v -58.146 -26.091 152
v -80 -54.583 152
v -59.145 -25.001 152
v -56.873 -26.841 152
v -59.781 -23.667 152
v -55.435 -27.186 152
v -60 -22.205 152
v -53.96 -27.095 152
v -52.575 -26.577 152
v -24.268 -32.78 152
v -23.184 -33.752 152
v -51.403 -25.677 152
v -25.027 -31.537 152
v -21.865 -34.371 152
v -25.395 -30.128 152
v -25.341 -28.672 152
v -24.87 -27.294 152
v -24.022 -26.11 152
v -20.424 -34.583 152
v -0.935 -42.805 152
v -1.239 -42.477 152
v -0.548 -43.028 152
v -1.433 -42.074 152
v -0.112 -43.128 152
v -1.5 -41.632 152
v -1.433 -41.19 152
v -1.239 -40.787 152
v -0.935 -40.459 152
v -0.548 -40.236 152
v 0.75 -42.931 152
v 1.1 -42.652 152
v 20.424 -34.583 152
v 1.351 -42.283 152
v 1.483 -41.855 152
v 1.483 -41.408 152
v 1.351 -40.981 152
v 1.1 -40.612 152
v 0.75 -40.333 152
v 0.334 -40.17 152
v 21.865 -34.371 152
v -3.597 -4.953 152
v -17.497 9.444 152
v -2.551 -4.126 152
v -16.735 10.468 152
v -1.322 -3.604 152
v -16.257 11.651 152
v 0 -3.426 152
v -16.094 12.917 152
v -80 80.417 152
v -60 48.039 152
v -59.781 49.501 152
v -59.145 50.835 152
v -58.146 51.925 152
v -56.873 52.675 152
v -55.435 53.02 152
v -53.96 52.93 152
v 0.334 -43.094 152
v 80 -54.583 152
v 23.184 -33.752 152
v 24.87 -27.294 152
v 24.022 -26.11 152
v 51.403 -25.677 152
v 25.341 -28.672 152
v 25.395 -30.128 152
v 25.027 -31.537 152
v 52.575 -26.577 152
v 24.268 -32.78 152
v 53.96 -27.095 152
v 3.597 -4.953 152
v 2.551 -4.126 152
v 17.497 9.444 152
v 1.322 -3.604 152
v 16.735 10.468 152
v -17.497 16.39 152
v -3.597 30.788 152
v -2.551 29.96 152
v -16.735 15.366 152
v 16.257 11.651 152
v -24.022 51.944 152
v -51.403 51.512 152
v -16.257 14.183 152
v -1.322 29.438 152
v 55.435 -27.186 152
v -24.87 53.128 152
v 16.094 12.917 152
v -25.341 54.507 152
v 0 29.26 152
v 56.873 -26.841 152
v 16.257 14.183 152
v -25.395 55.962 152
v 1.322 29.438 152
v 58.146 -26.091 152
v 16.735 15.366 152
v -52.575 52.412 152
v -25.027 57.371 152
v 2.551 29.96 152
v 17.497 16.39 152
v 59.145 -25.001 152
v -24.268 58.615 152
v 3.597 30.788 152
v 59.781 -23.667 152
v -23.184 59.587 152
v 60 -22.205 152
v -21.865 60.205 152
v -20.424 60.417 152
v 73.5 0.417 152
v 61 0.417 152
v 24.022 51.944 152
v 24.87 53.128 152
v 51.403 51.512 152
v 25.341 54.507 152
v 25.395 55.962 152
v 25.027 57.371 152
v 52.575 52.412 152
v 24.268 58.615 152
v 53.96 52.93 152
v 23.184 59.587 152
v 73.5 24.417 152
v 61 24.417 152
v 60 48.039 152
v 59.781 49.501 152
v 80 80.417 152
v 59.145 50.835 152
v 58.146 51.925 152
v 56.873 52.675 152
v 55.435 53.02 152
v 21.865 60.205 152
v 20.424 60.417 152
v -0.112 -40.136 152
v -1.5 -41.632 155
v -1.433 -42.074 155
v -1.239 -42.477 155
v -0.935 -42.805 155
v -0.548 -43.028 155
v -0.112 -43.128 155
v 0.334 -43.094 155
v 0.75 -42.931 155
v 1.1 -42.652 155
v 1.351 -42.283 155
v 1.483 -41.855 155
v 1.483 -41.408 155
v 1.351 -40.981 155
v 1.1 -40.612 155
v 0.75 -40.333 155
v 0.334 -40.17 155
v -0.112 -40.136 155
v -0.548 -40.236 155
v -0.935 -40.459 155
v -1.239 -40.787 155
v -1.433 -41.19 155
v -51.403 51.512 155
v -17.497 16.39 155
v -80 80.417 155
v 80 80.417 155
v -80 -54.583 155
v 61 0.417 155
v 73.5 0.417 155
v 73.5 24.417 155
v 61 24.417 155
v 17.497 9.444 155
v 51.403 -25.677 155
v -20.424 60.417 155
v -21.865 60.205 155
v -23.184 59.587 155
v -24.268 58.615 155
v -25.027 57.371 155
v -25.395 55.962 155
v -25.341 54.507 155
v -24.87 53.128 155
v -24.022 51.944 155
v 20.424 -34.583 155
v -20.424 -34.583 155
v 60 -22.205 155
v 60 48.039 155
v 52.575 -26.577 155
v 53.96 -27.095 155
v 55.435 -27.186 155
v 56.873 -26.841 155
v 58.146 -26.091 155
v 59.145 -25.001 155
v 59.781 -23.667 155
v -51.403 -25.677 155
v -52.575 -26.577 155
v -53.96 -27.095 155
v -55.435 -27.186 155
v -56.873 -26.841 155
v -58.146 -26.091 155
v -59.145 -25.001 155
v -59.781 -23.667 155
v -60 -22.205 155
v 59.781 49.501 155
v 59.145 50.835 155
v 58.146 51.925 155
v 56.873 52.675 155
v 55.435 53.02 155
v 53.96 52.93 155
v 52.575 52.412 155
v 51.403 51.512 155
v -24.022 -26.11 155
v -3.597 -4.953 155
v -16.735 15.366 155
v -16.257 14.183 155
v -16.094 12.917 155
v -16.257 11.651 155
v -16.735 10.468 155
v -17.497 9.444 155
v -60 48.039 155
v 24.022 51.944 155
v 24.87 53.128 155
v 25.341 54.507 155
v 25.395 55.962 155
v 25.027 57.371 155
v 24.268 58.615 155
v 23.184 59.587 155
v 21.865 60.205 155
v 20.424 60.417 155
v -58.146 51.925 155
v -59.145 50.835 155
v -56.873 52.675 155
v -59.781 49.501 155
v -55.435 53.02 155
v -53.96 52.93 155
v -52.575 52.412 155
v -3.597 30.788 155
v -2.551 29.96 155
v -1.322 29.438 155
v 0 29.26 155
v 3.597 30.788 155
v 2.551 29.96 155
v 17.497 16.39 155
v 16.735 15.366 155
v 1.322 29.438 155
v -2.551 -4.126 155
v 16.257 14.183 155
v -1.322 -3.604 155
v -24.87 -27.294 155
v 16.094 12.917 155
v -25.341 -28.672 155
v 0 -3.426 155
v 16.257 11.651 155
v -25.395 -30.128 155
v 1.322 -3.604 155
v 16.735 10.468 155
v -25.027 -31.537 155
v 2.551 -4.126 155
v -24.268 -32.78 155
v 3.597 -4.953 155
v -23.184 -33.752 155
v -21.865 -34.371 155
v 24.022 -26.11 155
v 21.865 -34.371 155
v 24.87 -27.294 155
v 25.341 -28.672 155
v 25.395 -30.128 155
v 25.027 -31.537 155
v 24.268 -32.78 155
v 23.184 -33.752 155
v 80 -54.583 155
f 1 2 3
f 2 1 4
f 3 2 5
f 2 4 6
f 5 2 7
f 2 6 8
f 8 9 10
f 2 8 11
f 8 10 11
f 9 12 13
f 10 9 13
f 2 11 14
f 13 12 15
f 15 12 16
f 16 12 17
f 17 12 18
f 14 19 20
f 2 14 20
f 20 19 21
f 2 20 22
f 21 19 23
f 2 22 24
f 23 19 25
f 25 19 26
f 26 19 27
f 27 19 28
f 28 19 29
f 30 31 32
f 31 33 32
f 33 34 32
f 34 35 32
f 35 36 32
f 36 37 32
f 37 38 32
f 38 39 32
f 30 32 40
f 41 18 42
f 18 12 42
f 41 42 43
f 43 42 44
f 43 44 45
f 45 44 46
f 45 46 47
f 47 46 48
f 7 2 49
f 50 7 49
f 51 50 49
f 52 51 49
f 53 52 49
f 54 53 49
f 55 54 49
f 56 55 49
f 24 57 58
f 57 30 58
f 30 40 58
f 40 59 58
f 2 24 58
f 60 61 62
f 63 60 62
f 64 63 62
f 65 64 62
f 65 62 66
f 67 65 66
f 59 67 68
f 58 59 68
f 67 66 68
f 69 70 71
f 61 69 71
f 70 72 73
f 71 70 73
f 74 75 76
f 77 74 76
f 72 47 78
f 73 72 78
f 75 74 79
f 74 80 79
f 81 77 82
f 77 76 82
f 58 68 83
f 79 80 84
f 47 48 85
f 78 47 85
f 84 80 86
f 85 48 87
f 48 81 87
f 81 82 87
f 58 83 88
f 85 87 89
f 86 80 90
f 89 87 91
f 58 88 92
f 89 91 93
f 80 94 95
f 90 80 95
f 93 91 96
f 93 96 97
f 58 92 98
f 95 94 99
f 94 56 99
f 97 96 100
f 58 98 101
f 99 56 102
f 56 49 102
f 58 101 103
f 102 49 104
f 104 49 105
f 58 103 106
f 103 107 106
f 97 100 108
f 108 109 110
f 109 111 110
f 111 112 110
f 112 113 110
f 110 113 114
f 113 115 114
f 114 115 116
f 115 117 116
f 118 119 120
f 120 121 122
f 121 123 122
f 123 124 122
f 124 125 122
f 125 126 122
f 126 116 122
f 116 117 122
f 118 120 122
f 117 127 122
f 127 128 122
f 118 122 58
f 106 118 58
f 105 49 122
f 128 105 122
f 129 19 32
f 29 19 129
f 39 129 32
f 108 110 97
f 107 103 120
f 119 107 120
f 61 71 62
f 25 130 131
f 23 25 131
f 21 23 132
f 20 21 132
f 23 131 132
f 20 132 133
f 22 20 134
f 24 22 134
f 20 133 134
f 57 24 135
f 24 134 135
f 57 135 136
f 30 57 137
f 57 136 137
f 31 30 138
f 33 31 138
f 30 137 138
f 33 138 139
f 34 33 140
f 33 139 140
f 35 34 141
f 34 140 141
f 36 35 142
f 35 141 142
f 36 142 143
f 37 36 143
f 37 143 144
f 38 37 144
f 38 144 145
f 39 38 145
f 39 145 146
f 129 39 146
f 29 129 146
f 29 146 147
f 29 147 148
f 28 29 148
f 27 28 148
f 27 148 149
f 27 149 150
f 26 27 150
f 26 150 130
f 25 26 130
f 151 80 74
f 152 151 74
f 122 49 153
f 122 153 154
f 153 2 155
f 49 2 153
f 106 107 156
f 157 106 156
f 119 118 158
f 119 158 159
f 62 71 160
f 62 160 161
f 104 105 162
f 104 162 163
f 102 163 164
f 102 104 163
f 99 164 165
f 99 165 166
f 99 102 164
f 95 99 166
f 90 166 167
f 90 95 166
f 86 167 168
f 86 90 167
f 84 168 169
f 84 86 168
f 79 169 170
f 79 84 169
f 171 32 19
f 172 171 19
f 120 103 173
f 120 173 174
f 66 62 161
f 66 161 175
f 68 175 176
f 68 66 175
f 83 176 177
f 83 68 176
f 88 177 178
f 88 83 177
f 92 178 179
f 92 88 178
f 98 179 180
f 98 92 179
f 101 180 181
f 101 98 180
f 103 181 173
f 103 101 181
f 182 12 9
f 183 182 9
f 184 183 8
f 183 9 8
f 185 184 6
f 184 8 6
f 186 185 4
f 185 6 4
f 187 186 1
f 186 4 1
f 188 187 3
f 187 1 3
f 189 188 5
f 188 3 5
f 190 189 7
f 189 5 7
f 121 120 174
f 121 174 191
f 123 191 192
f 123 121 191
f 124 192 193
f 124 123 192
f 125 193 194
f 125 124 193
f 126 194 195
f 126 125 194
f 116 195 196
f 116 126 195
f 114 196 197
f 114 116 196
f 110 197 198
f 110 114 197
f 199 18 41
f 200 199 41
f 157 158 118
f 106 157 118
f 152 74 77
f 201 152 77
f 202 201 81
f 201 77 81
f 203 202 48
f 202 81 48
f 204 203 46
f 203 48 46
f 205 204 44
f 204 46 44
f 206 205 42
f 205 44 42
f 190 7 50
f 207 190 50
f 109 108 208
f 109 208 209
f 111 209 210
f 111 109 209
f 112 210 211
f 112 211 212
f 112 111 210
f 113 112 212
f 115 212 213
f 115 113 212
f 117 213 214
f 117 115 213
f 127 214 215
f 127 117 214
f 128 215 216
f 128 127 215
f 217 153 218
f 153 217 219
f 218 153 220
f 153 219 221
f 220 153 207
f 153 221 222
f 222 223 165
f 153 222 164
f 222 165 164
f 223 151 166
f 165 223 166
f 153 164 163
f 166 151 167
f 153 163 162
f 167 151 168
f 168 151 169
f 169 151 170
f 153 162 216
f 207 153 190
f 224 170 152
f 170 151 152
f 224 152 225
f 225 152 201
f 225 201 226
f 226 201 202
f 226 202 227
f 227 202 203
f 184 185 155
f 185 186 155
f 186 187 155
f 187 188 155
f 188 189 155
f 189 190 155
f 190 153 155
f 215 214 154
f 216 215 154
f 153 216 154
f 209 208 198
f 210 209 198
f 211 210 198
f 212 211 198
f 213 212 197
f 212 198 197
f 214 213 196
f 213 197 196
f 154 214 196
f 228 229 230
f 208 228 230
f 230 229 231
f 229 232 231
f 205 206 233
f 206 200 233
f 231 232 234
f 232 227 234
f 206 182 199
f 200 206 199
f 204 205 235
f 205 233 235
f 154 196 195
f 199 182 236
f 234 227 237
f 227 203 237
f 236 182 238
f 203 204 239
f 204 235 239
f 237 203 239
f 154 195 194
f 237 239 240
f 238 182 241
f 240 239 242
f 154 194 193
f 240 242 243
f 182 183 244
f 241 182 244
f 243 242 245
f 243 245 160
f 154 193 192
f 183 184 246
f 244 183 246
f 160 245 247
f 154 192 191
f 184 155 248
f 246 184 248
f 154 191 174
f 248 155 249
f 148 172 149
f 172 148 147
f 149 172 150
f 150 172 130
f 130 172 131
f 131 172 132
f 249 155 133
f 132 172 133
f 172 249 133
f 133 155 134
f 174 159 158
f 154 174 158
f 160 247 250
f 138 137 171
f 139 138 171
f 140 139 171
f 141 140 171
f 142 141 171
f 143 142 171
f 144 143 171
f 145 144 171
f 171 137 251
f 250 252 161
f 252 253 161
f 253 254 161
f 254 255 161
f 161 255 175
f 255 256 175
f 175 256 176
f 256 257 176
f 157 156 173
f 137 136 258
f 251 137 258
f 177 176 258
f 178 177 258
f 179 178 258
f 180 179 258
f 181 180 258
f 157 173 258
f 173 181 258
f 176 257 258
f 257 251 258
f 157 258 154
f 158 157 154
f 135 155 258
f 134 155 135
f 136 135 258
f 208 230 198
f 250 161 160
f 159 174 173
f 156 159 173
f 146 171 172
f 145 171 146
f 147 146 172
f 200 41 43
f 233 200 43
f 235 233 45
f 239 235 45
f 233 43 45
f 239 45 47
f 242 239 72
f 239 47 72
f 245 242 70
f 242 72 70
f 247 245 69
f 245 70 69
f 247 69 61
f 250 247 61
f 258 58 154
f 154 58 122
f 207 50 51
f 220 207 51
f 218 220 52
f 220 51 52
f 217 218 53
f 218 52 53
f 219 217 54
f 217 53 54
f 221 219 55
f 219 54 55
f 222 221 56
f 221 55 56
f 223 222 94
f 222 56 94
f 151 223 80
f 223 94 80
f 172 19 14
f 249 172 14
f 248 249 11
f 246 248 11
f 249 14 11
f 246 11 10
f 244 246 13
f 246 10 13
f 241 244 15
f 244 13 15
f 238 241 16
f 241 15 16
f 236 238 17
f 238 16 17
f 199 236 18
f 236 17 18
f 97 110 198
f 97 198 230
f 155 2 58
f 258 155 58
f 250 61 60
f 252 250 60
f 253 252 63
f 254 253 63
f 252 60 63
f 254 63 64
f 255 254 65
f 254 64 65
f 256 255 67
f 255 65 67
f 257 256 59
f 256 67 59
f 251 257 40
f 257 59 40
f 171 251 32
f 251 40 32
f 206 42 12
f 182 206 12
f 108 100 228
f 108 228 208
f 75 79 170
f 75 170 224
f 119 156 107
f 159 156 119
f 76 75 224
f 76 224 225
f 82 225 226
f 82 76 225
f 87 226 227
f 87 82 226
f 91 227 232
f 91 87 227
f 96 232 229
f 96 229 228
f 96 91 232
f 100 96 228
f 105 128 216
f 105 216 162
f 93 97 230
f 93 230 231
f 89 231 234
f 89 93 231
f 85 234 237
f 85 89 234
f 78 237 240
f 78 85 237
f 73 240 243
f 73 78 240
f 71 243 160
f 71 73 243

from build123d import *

# Parameters (mm, degrees)
SKETCH1_W           = 160
SKETCH1_H           = 135
BOSS_EXTRUDE1_DEPTH = 3
CUT_EXTRUDE1_DEPTH  = 20
SKETCH3_W           = 10
SKETCH3_H           = 20.2
CUT_EXTRUDE2_DEPTH  = 10
SKETCH5_W           = 10
SKETCH5_H           = 3
BOSS_EXTRUDE2_DEPTH = 30
SKETCH6_W           = 10
SKETCH6_H           = 20.15
CUT_EXTRUDE3_DEPTH  = 30
SKETCH7_W           = 10
SKETCH7_H           = 3
BOSS_EXTRUDE3_DEPTH = 30
SKETCH8_W           = 11.5
SKETCH8_H           = 21.5
CUT_EXTRUDE4_DEPTH  = 10
SKETCH9_W           = 11.5
SKETCH9_H           = 3
BOSS_EXTRUDE5_DEPTH = 30
SKETCH10_W          = 11
SKETCH10_H          = 21
CUT_EXTRUDE5_DEPTH  = 30
SKETCH11_W          = 3
SKETCH11_H          = 21
CUT_EXTRUDE6_DEPTH  = 1.5
SKETCH12_W          = 12.5
SKETCH12_H          = 3
CUT_EXTRUDE7_DEPTH  = 3


with BuildPart() as part:
    # Sketch1 → Boss-Extrude1 (new body)
    with BuildSketch(Plane.XY.offset(152)):
        with Locations((0, 12.91714511)):
            Rectangle(SKETCH1_W, SKETCH1_H)
        with BuildLine():
            Line((-60, -22.204596664), (-60, 48.038886885))
            ThreePointArc((-60, 48.038886885), (-56.872665603, 52.674954566), (-51.402750584, 51.511608676))
            Line((-51.402750584, 51.511608676), (-17.49683417, 16.389866902))
            ThreePointArc((-17.49683417, 16.389866902), (-16.094083586, 12.91714511), (-17.49683417, 9.444423319))
            Line((-17.49683417, 9.444423319), (-51.402750584, -25.677318456))
            ThreePointArc((-51.402750584, -25.677318456), (-56.872665603, -26.840664345), (-60, -22.204596664))
        make_face(mode=Mode.SUBTRACT)
        with BuildLine():
            Line((20.424315219, 60.41714511), (-20.424315219, 60.41714511))
            ThreePointArc((-20.424315219, 60.41714511), (-25.026684661, 57.371165459), (-24.021564635, 51.944423319))
            Line((-24.021564635, 51.944423319), (-3.597249416, 30.787716735))
            ThreePointArc((-3.597249416, 30.787716735), (0, 29.260438526), (3.597249416, 30.787716735))
            Line((3.597249416, 30.787716735), (24.021564635, 51.944423319))
            ThreePointArc((24.021564635, 51.944423319), (25.026684661, 57.371165459), (20.424315219, 60.41714511))
        make_face(mode=Mode.SUBTRACT)
        with BuildLine():
            Line((51.402750584, 51.511608676), (17.49683417, 16.389866902))
            ThreePointArc((17.49683417, 16.389866902), (16.094083586, 12.91714511), (17.49683417, 9.444423319))
            Line((17.49683417, 9.444423319), (51.402750584, -25.677318456))
            ThreePointArc((51.402750584, -25.677318456), (56.872665603, -26.840664345), (60, -22.204596664))
            Line((60, -22.204596664), (60, 48.038886885))
            ThreePointArc((60, 48.038886885), (56.872665603, 52.674954566), (51.402750584, 51.511608676))
        make_face(mode=Mode.SUBTRACT)
        with BuildLine():
            Line((-24.021564635, -26.110133098), (-3.597249416, -4.953426514))
            ThreePointArc((-3.597249416, -4.953426514), (0, -3.426148305), (3.597249416, -4.953426514))
            Line((3.597249416, -4.953426514), (24.021564635, -26.110133098))
            ThreePointArc((24.021564635, -26.110133098), (25.026684661, -31.536875238), (20.424315219, -34.58285489))
            Line((20.424315219, -34.58285489), (-20.424315219, -34.58285489))
            ThreePointArc((-20.424315219, -34.58285489), (-25.026684661, -31.536875238), (-24.021564635, -26.110133098))
        make_face(mode=Mode.SUBTRACT)
    extrude(amount=BOSS_EXTRUDE1_DEPTH)

    # Sketch2 → Cut-Extrude1 (cut)
    with BuildSketch(Plane.XY.offset(155)):
        with BuildLine():
            ThreePointArc((1.5, -41.631936217), (0, -40.131936217), (-1.5, -41.631936217))
            Line((-1.5, -41.631936217), (1.5, -41.631936217))
        make_face()
        with BuildLine():
            Line((1.5, -41.631936217), (-1.5, -41.631936217))
            ThreePointArc((-1.5, -41.631936217), (0, -43.131936217), (1.5, -41.631936217))
        make_face()
    extrude(amount=-CUT_EXTRUDE1_DEPTH, mode=Mode.SUBTRACT)

    # Sketch3 → Cut-Extrude2 (cut)
    with BuildSketch(Plane(origin=(80, -54.58285489, 155), x_dir=(-1, 0, 0), z_dir=(0, 0, -1))):
        with Locations((13, 65)):
            Rectangle(SKETCH3_W, SKETCH3_H)
    extrude(amount=CUT_EXTRUDE2_DEPTH, mode=Mode.SUBTRACT)

    # Sketch5 → Boss-Extrude2 (add)
    with BuildSketch(Plane(origin=(0, 0.31714511, 0), x_dir=(1, 0, 0), z_dir=(0, 1, 0))):
        with Locations((67, -153.5)):
            Rectangle(SKETCH5_W, SKETCH5_H)
    extrude(amount=BOSS_EXTRUDE2_DEPTH)

    # Sketch6 → Cut-Extrude3 (cut)
    with BuildSketch(Plane.XY.offset(155)):
        with Locations((67, 14.39214511)):
            Rectangle(SKETCH6_W, SKETCH6_H)
    extrude(amount=-CUT_EXTRUDE3_DEPTH, mode=Mode.SUBTRACT)

    # Sketch7 → Boss-Extrude3 (add)
    with BuildSketch(Plane(origin=(0, 4.31714511, 0), x_dir=(1, 0, 0), z_dir=(0, 1, 0))):
        with Locations((67, -153.5)):
            Rectangle(SKETCH7_W, SKETCH7_H)
    extrude(amount=BOSS_EXTRUDE3_DEPTH)

    # Sketch8 → Cut-Extrude4 (cut)
    with BuildSketch(Plane.XY.offset(155)):
        with Locations((73.437153805, 5.004502564)):
            Rectangle(SKETCH8_W, SKETCH8_H)
    extrude(amount=-CUT_EXTRUDE4_DEPTH, mode=Mode.SUBTRACT)

    # Sketch9 → Boss-Extrude5 (add)
    with BuildSketch(Plane(origin=(0, -5.745497436, 0), x_dir=(1, 0, 0), z_dir=(0, 1, 0))):
        with Locations((73.437153805, -153.5)):
            Rectangle(SKETCH9_W, SKETCH9_H)
    extrude(amount=BOSS_EXTRUDE5_DEPTH)

    # Sketch10 → Cut-Extrude5 (cut)
    with BuildSketch(Plane.XY.offset(155)):
        with Locations((66.5, 10.91714511)):
            Rectangle(SKETCH10_W, SKETCH10_H)
    extrude(amount=-CUT_EXTRUDE5_DEPTH, mode=Mode.SUBTRACT)

    # Sketch11 → Cut-Extrude6 (cut)
    with BuildSketch(Plane.ZY.offset(-72)):
        with Locations((153.5, 10.91714511)):
            Rectangle(SKETCH11_W, SKETCH11_H)
    extrude(amount=-CUT_EXTRUDE6_DEPTH, mode=Mode.SUBTRACT)

    # Sketch12 → Cut-Extrude7 (cut)
    with BuildSketch(Plane(origin=(0, 21.41714511, 0), x_dir=(-1, 0, 0), z_dir=(0, -1, 0))):
        with Locations((-67.25, -153.5)):
            Rectangle(SKETCH12_W, SKETCH12_H)
    extrude(amount=-CUT_EXTRUDE7_DEPTH, mode=Mode.SUBTRACT)


solid = part.part
